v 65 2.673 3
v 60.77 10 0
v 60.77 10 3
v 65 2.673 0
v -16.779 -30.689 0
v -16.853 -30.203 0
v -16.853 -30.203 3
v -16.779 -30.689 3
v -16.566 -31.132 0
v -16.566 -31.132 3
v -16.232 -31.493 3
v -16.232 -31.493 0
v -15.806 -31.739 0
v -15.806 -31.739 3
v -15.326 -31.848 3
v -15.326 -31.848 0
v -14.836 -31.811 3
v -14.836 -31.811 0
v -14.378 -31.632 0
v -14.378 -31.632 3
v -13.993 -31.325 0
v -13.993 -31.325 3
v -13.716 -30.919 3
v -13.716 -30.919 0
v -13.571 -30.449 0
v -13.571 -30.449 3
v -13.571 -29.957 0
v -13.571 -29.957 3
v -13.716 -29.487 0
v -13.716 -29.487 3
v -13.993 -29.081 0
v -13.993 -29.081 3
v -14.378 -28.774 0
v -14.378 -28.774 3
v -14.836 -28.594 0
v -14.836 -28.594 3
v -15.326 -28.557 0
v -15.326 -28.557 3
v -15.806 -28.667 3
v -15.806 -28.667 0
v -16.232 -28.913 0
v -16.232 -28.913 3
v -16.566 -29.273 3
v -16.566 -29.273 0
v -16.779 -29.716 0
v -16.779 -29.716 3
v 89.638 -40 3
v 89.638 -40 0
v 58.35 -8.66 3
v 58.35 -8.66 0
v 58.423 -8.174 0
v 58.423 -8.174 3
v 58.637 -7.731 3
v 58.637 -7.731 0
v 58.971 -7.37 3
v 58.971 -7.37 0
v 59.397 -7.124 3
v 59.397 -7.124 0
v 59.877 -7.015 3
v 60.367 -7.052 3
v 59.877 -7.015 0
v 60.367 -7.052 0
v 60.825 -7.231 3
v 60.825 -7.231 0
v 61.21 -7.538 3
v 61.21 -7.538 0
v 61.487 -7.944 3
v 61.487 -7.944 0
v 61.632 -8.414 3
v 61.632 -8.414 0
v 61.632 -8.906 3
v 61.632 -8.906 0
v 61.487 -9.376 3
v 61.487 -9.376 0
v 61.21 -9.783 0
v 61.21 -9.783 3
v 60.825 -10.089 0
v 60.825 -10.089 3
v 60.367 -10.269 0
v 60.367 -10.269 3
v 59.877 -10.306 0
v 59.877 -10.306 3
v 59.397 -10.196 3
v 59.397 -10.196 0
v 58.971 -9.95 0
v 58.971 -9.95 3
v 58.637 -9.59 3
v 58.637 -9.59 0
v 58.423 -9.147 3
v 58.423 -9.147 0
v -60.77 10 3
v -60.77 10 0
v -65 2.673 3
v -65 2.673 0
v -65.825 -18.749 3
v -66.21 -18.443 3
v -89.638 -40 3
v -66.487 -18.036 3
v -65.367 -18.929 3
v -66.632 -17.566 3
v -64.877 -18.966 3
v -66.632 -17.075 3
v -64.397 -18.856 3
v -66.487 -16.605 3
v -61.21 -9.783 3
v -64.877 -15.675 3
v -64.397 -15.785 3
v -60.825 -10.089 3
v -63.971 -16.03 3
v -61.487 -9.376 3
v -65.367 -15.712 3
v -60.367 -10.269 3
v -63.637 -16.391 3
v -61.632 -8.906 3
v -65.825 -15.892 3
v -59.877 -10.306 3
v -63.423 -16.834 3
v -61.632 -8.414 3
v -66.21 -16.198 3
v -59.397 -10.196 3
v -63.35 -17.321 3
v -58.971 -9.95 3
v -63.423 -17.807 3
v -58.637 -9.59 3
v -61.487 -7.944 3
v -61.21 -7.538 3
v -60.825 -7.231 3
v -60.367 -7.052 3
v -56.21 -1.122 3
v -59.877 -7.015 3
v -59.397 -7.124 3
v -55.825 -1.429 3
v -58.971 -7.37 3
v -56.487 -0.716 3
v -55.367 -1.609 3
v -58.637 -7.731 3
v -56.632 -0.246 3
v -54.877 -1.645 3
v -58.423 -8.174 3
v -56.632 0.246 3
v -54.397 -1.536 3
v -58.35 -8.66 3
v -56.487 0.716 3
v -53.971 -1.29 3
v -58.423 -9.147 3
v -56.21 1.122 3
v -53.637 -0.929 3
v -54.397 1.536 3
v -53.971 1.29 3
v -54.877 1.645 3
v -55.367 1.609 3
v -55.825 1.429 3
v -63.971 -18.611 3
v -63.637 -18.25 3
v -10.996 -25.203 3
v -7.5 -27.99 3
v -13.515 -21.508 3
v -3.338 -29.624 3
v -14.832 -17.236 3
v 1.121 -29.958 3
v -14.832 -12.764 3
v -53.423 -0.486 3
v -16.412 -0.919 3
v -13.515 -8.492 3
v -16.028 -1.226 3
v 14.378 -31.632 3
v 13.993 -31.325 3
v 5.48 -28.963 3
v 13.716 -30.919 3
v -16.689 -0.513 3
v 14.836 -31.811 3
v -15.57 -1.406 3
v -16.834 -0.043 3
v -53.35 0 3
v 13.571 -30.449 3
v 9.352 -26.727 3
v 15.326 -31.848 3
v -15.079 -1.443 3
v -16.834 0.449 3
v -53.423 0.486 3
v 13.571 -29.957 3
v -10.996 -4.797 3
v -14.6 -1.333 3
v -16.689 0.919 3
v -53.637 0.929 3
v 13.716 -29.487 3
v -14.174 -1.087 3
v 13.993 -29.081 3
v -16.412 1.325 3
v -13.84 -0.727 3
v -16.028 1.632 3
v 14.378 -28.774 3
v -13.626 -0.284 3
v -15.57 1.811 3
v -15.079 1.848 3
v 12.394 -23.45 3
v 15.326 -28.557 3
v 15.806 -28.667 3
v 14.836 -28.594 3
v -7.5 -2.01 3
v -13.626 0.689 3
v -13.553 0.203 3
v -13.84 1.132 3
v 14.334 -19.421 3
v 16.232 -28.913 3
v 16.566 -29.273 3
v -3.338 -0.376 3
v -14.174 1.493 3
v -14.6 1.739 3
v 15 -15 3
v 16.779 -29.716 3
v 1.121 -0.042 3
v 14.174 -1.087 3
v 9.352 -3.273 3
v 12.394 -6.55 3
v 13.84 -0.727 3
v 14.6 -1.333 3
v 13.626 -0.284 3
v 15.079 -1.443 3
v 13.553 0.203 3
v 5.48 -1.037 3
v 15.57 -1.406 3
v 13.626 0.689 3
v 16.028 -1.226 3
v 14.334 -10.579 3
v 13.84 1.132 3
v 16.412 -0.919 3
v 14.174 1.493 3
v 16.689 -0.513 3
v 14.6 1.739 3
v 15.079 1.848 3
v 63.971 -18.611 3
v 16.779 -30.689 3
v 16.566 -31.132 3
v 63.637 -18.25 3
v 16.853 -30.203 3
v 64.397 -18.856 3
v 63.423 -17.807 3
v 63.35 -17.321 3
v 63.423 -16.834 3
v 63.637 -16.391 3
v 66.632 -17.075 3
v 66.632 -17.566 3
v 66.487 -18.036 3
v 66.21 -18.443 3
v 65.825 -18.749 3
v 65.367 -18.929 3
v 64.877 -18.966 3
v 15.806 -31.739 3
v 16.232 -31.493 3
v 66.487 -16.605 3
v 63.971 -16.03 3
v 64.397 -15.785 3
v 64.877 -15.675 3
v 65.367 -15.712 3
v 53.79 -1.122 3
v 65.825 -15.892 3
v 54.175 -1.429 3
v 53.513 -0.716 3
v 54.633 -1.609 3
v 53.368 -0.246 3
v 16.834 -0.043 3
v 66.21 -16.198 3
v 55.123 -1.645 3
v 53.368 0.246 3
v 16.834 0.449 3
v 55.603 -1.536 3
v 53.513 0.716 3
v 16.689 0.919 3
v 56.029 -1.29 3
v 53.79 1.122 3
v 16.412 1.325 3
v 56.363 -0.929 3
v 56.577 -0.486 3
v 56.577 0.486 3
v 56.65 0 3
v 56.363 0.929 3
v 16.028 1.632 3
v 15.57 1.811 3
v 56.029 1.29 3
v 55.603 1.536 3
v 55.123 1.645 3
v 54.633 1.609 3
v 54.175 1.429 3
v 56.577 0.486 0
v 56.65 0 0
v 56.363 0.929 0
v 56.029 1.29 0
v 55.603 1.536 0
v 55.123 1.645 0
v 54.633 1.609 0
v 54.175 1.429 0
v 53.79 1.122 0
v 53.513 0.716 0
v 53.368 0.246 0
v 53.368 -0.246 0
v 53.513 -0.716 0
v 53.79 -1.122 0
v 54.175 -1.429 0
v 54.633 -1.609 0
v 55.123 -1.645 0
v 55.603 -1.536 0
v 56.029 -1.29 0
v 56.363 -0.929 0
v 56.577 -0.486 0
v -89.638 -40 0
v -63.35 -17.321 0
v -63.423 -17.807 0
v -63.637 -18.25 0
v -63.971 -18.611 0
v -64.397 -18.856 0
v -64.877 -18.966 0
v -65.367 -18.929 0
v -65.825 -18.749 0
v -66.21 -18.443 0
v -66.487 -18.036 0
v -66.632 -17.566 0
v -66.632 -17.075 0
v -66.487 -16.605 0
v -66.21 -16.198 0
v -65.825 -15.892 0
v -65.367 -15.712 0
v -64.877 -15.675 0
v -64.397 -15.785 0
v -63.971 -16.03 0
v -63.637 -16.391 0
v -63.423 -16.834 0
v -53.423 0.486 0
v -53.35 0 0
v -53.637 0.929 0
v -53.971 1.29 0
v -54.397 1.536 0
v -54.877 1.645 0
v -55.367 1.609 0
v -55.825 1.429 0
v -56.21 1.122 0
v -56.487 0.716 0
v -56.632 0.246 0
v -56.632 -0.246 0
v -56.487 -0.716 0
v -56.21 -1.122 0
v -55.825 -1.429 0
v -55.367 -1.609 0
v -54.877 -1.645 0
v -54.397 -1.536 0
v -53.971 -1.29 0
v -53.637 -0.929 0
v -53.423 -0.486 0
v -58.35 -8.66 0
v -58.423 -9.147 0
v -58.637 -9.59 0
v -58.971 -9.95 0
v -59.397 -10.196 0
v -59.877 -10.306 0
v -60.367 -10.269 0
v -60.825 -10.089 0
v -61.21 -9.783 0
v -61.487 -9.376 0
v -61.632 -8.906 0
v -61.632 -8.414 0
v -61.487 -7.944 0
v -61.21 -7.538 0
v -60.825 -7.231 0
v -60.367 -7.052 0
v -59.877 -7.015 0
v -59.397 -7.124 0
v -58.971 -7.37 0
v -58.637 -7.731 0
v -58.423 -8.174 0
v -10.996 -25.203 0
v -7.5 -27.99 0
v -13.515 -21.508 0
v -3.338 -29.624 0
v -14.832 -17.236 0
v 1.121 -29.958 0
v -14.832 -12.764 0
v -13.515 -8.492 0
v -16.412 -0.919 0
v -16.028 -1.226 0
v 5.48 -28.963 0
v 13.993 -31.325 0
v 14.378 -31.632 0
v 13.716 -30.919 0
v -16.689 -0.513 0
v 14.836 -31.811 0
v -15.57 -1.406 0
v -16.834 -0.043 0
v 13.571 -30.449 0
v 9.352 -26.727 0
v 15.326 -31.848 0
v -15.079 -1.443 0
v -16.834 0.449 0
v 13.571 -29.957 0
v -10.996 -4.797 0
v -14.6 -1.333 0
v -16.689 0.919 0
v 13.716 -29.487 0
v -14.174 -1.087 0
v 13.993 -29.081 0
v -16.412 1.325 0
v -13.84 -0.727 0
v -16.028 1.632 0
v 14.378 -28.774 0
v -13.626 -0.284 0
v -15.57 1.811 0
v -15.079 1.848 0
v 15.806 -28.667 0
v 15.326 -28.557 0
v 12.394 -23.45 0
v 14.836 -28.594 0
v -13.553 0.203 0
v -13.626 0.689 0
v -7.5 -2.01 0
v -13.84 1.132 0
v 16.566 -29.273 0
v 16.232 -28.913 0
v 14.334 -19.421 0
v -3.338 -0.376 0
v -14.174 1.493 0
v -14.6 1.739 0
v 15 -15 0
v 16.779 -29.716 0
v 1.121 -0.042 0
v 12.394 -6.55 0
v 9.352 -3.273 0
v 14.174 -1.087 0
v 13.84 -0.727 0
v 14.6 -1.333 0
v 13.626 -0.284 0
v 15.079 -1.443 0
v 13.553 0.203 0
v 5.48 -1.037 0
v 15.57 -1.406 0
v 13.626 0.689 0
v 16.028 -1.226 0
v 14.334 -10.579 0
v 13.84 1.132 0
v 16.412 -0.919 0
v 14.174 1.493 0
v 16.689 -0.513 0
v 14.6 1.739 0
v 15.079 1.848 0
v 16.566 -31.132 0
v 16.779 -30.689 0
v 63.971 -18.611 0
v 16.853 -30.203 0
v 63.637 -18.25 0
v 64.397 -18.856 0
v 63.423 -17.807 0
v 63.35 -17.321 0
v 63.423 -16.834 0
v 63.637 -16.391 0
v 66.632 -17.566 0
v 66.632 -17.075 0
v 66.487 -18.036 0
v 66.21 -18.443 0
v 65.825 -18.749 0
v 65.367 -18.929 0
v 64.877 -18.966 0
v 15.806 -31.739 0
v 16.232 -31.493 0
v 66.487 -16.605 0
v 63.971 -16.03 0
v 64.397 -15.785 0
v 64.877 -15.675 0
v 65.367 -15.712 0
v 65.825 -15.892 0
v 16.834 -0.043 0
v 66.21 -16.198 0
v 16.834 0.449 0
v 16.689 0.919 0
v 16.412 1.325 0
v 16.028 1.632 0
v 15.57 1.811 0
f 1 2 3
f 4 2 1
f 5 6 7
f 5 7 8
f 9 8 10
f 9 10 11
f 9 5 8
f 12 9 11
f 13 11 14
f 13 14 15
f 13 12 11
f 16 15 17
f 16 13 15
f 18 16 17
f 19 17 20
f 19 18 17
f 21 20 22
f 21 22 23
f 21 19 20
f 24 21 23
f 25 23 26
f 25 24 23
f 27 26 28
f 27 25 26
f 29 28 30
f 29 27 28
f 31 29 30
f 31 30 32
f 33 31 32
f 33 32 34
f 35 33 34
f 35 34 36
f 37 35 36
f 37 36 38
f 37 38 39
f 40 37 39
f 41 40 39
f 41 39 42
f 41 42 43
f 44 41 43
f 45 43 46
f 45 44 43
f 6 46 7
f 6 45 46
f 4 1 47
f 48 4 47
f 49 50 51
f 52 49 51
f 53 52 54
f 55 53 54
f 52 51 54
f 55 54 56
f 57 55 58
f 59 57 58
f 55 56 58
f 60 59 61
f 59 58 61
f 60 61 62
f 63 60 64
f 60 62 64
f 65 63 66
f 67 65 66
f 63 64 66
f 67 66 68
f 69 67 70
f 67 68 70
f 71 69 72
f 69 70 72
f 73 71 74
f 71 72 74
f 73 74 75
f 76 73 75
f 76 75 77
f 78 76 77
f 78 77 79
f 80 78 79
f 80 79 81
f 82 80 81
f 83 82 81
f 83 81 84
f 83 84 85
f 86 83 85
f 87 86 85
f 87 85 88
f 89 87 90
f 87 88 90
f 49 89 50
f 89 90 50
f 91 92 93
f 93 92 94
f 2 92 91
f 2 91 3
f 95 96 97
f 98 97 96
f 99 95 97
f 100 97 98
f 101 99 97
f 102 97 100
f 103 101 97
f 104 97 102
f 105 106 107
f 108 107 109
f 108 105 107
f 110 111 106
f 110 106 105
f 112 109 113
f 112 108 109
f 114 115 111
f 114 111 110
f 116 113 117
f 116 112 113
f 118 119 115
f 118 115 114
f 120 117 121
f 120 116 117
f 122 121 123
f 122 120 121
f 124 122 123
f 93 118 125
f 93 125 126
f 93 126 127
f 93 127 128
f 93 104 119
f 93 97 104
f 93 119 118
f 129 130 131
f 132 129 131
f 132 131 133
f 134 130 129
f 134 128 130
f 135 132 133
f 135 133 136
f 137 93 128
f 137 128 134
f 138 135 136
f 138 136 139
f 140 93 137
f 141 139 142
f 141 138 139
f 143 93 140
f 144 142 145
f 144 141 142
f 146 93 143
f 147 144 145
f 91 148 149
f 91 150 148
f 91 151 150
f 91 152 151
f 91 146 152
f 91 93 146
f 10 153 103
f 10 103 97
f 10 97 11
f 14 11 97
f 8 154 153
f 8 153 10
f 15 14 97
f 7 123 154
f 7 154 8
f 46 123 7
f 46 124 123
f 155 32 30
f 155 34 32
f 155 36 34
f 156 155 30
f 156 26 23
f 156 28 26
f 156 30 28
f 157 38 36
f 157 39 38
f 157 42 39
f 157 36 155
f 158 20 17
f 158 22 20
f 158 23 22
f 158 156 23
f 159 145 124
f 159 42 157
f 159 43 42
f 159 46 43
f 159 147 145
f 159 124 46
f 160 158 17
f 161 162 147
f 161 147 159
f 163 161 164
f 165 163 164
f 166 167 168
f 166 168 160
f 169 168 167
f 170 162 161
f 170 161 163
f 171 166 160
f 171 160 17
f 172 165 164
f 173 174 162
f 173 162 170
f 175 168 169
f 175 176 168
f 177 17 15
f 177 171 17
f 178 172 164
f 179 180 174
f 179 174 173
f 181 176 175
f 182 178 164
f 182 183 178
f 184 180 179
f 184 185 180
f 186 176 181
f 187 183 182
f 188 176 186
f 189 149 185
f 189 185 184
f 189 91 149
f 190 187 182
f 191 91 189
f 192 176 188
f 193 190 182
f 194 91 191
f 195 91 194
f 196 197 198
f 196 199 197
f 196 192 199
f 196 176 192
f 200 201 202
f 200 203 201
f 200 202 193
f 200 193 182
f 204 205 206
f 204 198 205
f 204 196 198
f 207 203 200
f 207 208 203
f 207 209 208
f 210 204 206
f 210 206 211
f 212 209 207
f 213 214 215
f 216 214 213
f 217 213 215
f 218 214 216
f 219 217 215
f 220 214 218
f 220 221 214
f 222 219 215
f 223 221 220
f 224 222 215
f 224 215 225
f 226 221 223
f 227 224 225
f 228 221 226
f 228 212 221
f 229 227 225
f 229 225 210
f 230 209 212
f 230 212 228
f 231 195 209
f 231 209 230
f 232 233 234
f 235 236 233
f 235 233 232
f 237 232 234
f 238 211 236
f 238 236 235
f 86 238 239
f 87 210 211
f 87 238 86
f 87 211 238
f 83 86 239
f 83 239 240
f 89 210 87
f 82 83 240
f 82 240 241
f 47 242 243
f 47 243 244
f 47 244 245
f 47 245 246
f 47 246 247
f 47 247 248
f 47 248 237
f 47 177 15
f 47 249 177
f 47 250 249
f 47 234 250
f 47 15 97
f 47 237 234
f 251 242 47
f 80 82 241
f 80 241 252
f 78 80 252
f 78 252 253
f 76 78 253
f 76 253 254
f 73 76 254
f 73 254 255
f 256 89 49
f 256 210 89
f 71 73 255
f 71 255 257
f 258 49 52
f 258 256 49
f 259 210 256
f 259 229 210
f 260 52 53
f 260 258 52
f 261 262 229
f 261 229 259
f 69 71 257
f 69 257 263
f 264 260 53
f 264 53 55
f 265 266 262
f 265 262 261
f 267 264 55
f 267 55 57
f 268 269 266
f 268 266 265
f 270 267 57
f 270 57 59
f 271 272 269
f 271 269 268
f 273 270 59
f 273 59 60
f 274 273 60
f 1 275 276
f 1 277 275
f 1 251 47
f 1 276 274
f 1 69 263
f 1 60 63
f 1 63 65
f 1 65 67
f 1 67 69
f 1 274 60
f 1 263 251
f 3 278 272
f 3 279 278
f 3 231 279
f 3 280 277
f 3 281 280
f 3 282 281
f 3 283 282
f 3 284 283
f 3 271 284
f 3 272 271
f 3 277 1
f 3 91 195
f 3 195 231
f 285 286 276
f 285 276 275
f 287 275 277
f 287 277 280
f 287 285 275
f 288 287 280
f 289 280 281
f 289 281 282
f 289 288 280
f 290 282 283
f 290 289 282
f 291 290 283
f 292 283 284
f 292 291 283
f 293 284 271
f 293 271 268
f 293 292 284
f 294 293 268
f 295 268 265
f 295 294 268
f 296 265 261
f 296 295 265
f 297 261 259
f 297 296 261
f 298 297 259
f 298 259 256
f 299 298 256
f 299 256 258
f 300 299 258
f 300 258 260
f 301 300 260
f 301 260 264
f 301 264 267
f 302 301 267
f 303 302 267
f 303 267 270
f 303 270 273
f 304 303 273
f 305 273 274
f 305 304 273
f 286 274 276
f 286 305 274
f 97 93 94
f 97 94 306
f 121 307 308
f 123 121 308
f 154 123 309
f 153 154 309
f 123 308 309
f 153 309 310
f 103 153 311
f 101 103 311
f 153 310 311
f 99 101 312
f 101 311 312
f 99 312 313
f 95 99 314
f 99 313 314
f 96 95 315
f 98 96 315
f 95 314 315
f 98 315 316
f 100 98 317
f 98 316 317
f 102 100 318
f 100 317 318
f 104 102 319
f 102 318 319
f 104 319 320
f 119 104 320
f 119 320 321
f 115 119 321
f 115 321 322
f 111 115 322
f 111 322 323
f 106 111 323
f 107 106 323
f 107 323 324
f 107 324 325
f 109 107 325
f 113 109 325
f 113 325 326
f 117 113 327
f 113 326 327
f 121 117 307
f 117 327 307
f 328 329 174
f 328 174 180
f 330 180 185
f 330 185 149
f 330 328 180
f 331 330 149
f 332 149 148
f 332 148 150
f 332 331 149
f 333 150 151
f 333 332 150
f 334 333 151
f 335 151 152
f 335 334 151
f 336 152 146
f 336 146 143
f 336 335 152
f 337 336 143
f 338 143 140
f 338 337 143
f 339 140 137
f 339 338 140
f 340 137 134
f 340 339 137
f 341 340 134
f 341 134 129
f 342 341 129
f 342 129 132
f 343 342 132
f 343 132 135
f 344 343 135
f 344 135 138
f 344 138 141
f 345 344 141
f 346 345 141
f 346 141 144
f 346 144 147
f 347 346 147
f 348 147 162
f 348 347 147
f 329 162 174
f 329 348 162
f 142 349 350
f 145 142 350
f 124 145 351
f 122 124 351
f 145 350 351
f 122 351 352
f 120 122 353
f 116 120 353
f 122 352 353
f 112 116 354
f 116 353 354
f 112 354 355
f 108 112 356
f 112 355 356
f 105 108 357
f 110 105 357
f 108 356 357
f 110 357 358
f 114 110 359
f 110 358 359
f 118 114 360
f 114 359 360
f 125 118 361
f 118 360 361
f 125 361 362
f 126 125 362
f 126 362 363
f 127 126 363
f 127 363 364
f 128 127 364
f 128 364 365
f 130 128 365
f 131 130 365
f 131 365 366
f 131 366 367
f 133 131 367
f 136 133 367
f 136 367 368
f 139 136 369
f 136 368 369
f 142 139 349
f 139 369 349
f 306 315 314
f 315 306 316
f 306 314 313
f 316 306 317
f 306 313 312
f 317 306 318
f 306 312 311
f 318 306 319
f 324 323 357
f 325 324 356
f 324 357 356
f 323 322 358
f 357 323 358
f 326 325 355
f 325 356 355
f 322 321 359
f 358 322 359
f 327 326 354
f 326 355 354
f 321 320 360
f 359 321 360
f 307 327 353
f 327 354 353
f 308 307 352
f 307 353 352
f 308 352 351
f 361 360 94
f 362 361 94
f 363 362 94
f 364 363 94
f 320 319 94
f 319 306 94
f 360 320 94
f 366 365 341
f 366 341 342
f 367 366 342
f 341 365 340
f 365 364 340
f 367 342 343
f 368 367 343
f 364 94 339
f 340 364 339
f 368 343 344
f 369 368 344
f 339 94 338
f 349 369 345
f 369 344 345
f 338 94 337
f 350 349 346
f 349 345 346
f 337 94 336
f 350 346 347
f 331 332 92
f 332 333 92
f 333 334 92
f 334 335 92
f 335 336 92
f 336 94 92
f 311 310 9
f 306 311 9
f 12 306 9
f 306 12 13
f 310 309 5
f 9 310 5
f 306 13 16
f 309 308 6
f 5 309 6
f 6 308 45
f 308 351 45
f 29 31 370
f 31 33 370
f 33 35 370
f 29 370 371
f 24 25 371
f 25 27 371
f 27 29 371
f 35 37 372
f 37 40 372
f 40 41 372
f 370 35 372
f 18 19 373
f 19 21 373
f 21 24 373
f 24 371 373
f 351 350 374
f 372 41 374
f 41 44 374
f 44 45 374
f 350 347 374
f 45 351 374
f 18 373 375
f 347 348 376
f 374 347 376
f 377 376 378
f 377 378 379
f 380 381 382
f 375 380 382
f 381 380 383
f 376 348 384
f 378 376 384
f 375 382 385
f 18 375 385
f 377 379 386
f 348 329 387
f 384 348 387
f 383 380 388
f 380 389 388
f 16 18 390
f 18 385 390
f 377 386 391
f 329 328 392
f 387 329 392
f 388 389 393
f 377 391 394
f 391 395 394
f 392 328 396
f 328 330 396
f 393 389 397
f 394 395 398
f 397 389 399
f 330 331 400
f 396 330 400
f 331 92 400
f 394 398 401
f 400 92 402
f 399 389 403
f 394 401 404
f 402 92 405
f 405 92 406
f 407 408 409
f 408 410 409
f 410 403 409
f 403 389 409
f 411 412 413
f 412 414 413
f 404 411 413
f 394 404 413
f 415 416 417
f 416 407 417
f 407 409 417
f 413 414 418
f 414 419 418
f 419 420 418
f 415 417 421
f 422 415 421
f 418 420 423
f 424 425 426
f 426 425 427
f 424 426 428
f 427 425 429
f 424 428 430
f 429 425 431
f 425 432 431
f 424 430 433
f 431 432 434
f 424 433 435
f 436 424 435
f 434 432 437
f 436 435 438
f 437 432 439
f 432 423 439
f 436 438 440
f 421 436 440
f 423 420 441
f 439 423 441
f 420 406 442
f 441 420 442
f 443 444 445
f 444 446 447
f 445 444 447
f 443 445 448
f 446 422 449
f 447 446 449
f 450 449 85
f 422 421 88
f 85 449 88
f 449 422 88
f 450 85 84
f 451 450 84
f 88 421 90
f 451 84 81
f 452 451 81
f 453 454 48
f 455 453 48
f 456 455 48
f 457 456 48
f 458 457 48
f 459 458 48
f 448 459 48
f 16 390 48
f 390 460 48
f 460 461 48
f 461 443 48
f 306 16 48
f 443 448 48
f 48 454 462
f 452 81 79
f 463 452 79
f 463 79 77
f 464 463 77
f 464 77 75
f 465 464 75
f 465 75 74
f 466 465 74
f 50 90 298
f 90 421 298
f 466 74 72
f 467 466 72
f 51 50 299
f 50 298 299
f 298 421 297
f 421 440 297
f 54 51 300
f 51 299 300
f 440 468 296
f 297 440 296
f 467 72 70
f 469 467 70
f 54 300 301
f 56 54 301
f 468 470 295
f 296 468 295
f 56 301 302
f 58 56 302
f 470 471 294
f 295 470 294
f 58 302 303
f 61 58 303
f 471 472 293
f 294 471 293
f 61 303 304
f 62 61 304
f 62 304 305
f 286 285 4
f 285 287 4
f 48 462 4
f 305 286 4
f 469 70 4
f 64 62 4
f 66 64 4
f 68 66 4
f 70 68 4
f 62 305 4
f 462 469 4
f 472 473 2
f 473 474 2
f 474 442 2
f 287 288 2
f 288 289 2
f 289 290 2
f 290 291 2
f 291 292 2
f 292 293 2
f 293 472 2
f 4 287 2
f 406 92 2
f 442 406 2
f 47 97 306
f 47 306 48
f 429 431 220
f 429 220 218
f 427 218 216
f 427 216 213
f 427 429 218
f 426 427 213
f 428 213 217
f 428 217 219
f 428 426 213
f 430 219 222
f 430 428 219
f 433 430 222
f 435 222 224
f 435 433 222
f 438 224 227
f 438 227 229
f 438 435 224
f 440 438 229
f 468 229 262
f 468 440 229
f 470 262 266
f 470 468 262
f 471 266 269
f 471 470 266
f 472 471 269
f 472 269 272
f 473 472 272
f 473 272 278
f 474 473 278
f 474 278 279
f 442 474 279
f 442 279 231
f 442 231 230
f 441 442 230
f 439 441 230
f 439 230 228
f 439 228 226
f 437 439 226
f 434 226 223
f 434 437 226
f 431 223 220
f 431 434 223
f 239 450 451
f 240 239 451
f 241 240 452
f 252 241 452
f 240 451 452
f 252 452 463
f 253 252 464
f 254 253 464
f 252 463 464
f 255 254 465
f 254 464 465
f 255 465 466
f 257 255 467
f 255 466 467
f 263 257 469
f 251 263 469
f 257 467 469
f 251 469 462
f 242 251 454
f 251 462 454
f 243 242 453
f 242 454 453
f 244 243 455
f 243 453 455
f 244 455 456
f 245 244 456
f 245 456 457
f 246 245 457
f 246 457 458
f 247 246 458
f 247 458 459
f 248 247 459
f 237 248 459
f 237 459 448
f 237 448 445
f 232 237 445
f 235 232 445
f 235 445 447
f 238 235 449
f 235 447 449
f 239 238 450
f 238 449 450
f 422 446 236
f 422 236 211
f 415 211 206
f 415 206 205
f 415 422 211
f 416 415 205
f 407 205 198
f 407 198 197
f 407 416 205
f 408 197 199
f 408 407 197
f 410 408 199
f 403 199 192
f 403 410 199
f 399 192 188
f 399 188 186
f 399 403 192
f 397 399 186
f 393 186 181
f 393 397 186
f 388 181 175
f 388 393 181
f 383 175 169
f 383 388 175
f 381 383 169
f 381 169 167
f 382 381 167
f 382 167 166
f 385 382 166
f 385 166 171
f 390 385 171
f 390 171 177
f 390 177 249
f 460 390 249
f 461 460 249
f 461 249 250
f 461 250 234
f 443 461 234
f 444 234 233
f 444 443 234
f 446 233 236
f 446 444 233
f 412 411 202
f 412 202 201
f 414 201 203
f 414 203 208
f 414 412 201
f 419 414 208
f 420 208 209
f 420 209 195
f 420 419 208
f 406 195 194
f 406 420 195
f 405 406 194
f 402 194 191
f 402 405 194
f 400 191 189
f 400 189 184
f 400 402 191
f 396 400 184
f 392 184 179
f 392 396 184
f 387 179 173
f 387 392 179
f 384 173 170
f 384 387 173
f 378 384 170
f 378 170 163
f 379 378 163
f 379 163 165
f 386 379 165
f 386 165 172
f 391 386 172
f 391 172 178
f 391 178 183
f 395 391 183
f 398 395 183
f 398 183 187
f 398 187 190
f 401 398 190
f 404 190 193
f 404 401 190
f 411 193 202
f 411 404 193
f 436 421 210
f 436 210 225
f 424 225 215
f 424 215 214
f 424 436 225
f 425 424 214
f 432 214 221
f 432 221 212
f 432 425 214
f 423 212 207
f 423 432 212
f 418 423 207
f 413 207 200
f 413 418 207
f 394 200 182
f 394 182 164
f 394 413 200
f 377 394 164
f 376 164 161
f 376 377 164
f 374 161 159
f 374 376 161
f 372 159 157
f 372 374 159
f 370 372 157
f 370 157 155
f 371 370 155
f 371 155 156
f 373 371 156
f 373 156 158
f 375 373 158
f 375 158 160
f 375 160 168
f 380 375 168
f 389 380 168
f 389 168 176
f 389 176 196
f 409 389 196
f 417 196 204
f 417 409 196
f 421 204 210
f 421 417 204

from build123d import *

# Parameters (mm, degrees)
SKETCH_1_W          = 130
SKETCH_1_H          = 20
SKETCH_1_R          = 1.65
EXTRUDE_1_DEPTH     = 3
SKETCH_2_W          = 130
SKETCH_2_H          = 30
EXTRUDE_2_DEPTH     = 3
SKETCH_3_R          = 15
SKETCH_3_R_2        = 1.65
CUT_EXTRUDE_1_DEPTH = 3
CUT_EXTRUDE_2_DEPTH = 3
EXTRUDE_3_DEPTH     = 3
SKETCH_6_R          = 1.65
CUT_EXTRUDE_3_DEPTH = 3


with BuildPart() as part:
    # 草图1 → 凸台-拉伸1 (new body)
    with BuildSketch(Plane.XY):
        Rectangle(SKETCH_1_W, SKETCH_1_H)
        with Locations((-55, 0)):
            Circle(SKETCH_1_R, mode=Mode.SUBTRACT)
        with Locations((55, 0)):
            Circle(SKETCH_1_R, mode=Mode.SUBTRACT)
    extrude(amount=EXTRUDE_1_DEPTH)

    # 草图2 → 凸台-拉伸2 (add)
    with BuildSketch(Plane.XY.offset(3)):
        with Locations((0, -25)):
            Rectangle(SKETCH_2_W, SKETCH_2_H)
    extrude(amount=-EXTRUDE_2_DEPTH)

    # 草图3 → 切除-拉伸1 (cut)
    with BuildSketch(Plane.XY):
        with Locations((0, -15)):
            Circle(SKETCH_3_R)
        with Locations((-15.202795796, 0.202795796)):
            Circle(SKETCH_3_R_2)
        with Locations(Location((-15.202795796, -30.202795796, 0), (0, 0, 180))):
            Circle(SKETCH_3_R_2)
        with Locations((15.202795796, -30.202795796)):
            Circle(SKETCH_3_R_2)
        with Locations(Location((15.202795796, 0.202795796, 0), (0, 0, 180))):
            Circle(SKETCH_3_R_2)
    extrude(amount=CUT_EXTRUDE_1_DEPTH, mode=Mode.SUBTRACT)

    # 草图4 → 切除-拉伸2 (cut)
    with BuildSketch(Plane.XY):
        Polygon((65, 10), (60.77, 10), (65, 2.673425084), align=None)
        Polygon((-65, 2.673425084), (-65, 10), (-60.77, 10), align=None)
    extrude(amount=CUT_EXTRUDE_2_DEPTH, mode=Mode.SUBTRACT)

    # 草图5 → 凸台-拉伸3 (add)
    with BuildSketch(Plane.XY.offset(3)):
        Polygon((-65, 2.673425084), (-89.637513459, -40), (-65, -40), align=None)
        Polygon((89.637513459, -40), (65, -40), (65, 2.673425084), align=None)
    extrude(amount=-EXTRUDE_3_DEPTH)

    # 草图6 → 切除-拉伸3 (cut)
    with BuildSketch(Plane(origin=(0, 0, 0), x_dir=(-1, 0, 0), z_dir=(0, 0, -1))):
        with Locations((-60, -8.660254038)):
            Circle(SKETCH_6_R)
        with Locations((-65, -17.320508076)):
            Circle(SKETCH_6_R)
        with Locations(Location((65, -17.320508076, 0), (0, 0, 180))):
            Circle(SKETCH_6_R)
        with Locations(Location((60, -8.660254038, 0), (0, 0, 180))):
            Circle(SKETCH_6_R)
    extrude(amount=-CUT_EXTRUDE_3_DEPTH, mode=Mode.SUBTRACT)


solid = part.part
